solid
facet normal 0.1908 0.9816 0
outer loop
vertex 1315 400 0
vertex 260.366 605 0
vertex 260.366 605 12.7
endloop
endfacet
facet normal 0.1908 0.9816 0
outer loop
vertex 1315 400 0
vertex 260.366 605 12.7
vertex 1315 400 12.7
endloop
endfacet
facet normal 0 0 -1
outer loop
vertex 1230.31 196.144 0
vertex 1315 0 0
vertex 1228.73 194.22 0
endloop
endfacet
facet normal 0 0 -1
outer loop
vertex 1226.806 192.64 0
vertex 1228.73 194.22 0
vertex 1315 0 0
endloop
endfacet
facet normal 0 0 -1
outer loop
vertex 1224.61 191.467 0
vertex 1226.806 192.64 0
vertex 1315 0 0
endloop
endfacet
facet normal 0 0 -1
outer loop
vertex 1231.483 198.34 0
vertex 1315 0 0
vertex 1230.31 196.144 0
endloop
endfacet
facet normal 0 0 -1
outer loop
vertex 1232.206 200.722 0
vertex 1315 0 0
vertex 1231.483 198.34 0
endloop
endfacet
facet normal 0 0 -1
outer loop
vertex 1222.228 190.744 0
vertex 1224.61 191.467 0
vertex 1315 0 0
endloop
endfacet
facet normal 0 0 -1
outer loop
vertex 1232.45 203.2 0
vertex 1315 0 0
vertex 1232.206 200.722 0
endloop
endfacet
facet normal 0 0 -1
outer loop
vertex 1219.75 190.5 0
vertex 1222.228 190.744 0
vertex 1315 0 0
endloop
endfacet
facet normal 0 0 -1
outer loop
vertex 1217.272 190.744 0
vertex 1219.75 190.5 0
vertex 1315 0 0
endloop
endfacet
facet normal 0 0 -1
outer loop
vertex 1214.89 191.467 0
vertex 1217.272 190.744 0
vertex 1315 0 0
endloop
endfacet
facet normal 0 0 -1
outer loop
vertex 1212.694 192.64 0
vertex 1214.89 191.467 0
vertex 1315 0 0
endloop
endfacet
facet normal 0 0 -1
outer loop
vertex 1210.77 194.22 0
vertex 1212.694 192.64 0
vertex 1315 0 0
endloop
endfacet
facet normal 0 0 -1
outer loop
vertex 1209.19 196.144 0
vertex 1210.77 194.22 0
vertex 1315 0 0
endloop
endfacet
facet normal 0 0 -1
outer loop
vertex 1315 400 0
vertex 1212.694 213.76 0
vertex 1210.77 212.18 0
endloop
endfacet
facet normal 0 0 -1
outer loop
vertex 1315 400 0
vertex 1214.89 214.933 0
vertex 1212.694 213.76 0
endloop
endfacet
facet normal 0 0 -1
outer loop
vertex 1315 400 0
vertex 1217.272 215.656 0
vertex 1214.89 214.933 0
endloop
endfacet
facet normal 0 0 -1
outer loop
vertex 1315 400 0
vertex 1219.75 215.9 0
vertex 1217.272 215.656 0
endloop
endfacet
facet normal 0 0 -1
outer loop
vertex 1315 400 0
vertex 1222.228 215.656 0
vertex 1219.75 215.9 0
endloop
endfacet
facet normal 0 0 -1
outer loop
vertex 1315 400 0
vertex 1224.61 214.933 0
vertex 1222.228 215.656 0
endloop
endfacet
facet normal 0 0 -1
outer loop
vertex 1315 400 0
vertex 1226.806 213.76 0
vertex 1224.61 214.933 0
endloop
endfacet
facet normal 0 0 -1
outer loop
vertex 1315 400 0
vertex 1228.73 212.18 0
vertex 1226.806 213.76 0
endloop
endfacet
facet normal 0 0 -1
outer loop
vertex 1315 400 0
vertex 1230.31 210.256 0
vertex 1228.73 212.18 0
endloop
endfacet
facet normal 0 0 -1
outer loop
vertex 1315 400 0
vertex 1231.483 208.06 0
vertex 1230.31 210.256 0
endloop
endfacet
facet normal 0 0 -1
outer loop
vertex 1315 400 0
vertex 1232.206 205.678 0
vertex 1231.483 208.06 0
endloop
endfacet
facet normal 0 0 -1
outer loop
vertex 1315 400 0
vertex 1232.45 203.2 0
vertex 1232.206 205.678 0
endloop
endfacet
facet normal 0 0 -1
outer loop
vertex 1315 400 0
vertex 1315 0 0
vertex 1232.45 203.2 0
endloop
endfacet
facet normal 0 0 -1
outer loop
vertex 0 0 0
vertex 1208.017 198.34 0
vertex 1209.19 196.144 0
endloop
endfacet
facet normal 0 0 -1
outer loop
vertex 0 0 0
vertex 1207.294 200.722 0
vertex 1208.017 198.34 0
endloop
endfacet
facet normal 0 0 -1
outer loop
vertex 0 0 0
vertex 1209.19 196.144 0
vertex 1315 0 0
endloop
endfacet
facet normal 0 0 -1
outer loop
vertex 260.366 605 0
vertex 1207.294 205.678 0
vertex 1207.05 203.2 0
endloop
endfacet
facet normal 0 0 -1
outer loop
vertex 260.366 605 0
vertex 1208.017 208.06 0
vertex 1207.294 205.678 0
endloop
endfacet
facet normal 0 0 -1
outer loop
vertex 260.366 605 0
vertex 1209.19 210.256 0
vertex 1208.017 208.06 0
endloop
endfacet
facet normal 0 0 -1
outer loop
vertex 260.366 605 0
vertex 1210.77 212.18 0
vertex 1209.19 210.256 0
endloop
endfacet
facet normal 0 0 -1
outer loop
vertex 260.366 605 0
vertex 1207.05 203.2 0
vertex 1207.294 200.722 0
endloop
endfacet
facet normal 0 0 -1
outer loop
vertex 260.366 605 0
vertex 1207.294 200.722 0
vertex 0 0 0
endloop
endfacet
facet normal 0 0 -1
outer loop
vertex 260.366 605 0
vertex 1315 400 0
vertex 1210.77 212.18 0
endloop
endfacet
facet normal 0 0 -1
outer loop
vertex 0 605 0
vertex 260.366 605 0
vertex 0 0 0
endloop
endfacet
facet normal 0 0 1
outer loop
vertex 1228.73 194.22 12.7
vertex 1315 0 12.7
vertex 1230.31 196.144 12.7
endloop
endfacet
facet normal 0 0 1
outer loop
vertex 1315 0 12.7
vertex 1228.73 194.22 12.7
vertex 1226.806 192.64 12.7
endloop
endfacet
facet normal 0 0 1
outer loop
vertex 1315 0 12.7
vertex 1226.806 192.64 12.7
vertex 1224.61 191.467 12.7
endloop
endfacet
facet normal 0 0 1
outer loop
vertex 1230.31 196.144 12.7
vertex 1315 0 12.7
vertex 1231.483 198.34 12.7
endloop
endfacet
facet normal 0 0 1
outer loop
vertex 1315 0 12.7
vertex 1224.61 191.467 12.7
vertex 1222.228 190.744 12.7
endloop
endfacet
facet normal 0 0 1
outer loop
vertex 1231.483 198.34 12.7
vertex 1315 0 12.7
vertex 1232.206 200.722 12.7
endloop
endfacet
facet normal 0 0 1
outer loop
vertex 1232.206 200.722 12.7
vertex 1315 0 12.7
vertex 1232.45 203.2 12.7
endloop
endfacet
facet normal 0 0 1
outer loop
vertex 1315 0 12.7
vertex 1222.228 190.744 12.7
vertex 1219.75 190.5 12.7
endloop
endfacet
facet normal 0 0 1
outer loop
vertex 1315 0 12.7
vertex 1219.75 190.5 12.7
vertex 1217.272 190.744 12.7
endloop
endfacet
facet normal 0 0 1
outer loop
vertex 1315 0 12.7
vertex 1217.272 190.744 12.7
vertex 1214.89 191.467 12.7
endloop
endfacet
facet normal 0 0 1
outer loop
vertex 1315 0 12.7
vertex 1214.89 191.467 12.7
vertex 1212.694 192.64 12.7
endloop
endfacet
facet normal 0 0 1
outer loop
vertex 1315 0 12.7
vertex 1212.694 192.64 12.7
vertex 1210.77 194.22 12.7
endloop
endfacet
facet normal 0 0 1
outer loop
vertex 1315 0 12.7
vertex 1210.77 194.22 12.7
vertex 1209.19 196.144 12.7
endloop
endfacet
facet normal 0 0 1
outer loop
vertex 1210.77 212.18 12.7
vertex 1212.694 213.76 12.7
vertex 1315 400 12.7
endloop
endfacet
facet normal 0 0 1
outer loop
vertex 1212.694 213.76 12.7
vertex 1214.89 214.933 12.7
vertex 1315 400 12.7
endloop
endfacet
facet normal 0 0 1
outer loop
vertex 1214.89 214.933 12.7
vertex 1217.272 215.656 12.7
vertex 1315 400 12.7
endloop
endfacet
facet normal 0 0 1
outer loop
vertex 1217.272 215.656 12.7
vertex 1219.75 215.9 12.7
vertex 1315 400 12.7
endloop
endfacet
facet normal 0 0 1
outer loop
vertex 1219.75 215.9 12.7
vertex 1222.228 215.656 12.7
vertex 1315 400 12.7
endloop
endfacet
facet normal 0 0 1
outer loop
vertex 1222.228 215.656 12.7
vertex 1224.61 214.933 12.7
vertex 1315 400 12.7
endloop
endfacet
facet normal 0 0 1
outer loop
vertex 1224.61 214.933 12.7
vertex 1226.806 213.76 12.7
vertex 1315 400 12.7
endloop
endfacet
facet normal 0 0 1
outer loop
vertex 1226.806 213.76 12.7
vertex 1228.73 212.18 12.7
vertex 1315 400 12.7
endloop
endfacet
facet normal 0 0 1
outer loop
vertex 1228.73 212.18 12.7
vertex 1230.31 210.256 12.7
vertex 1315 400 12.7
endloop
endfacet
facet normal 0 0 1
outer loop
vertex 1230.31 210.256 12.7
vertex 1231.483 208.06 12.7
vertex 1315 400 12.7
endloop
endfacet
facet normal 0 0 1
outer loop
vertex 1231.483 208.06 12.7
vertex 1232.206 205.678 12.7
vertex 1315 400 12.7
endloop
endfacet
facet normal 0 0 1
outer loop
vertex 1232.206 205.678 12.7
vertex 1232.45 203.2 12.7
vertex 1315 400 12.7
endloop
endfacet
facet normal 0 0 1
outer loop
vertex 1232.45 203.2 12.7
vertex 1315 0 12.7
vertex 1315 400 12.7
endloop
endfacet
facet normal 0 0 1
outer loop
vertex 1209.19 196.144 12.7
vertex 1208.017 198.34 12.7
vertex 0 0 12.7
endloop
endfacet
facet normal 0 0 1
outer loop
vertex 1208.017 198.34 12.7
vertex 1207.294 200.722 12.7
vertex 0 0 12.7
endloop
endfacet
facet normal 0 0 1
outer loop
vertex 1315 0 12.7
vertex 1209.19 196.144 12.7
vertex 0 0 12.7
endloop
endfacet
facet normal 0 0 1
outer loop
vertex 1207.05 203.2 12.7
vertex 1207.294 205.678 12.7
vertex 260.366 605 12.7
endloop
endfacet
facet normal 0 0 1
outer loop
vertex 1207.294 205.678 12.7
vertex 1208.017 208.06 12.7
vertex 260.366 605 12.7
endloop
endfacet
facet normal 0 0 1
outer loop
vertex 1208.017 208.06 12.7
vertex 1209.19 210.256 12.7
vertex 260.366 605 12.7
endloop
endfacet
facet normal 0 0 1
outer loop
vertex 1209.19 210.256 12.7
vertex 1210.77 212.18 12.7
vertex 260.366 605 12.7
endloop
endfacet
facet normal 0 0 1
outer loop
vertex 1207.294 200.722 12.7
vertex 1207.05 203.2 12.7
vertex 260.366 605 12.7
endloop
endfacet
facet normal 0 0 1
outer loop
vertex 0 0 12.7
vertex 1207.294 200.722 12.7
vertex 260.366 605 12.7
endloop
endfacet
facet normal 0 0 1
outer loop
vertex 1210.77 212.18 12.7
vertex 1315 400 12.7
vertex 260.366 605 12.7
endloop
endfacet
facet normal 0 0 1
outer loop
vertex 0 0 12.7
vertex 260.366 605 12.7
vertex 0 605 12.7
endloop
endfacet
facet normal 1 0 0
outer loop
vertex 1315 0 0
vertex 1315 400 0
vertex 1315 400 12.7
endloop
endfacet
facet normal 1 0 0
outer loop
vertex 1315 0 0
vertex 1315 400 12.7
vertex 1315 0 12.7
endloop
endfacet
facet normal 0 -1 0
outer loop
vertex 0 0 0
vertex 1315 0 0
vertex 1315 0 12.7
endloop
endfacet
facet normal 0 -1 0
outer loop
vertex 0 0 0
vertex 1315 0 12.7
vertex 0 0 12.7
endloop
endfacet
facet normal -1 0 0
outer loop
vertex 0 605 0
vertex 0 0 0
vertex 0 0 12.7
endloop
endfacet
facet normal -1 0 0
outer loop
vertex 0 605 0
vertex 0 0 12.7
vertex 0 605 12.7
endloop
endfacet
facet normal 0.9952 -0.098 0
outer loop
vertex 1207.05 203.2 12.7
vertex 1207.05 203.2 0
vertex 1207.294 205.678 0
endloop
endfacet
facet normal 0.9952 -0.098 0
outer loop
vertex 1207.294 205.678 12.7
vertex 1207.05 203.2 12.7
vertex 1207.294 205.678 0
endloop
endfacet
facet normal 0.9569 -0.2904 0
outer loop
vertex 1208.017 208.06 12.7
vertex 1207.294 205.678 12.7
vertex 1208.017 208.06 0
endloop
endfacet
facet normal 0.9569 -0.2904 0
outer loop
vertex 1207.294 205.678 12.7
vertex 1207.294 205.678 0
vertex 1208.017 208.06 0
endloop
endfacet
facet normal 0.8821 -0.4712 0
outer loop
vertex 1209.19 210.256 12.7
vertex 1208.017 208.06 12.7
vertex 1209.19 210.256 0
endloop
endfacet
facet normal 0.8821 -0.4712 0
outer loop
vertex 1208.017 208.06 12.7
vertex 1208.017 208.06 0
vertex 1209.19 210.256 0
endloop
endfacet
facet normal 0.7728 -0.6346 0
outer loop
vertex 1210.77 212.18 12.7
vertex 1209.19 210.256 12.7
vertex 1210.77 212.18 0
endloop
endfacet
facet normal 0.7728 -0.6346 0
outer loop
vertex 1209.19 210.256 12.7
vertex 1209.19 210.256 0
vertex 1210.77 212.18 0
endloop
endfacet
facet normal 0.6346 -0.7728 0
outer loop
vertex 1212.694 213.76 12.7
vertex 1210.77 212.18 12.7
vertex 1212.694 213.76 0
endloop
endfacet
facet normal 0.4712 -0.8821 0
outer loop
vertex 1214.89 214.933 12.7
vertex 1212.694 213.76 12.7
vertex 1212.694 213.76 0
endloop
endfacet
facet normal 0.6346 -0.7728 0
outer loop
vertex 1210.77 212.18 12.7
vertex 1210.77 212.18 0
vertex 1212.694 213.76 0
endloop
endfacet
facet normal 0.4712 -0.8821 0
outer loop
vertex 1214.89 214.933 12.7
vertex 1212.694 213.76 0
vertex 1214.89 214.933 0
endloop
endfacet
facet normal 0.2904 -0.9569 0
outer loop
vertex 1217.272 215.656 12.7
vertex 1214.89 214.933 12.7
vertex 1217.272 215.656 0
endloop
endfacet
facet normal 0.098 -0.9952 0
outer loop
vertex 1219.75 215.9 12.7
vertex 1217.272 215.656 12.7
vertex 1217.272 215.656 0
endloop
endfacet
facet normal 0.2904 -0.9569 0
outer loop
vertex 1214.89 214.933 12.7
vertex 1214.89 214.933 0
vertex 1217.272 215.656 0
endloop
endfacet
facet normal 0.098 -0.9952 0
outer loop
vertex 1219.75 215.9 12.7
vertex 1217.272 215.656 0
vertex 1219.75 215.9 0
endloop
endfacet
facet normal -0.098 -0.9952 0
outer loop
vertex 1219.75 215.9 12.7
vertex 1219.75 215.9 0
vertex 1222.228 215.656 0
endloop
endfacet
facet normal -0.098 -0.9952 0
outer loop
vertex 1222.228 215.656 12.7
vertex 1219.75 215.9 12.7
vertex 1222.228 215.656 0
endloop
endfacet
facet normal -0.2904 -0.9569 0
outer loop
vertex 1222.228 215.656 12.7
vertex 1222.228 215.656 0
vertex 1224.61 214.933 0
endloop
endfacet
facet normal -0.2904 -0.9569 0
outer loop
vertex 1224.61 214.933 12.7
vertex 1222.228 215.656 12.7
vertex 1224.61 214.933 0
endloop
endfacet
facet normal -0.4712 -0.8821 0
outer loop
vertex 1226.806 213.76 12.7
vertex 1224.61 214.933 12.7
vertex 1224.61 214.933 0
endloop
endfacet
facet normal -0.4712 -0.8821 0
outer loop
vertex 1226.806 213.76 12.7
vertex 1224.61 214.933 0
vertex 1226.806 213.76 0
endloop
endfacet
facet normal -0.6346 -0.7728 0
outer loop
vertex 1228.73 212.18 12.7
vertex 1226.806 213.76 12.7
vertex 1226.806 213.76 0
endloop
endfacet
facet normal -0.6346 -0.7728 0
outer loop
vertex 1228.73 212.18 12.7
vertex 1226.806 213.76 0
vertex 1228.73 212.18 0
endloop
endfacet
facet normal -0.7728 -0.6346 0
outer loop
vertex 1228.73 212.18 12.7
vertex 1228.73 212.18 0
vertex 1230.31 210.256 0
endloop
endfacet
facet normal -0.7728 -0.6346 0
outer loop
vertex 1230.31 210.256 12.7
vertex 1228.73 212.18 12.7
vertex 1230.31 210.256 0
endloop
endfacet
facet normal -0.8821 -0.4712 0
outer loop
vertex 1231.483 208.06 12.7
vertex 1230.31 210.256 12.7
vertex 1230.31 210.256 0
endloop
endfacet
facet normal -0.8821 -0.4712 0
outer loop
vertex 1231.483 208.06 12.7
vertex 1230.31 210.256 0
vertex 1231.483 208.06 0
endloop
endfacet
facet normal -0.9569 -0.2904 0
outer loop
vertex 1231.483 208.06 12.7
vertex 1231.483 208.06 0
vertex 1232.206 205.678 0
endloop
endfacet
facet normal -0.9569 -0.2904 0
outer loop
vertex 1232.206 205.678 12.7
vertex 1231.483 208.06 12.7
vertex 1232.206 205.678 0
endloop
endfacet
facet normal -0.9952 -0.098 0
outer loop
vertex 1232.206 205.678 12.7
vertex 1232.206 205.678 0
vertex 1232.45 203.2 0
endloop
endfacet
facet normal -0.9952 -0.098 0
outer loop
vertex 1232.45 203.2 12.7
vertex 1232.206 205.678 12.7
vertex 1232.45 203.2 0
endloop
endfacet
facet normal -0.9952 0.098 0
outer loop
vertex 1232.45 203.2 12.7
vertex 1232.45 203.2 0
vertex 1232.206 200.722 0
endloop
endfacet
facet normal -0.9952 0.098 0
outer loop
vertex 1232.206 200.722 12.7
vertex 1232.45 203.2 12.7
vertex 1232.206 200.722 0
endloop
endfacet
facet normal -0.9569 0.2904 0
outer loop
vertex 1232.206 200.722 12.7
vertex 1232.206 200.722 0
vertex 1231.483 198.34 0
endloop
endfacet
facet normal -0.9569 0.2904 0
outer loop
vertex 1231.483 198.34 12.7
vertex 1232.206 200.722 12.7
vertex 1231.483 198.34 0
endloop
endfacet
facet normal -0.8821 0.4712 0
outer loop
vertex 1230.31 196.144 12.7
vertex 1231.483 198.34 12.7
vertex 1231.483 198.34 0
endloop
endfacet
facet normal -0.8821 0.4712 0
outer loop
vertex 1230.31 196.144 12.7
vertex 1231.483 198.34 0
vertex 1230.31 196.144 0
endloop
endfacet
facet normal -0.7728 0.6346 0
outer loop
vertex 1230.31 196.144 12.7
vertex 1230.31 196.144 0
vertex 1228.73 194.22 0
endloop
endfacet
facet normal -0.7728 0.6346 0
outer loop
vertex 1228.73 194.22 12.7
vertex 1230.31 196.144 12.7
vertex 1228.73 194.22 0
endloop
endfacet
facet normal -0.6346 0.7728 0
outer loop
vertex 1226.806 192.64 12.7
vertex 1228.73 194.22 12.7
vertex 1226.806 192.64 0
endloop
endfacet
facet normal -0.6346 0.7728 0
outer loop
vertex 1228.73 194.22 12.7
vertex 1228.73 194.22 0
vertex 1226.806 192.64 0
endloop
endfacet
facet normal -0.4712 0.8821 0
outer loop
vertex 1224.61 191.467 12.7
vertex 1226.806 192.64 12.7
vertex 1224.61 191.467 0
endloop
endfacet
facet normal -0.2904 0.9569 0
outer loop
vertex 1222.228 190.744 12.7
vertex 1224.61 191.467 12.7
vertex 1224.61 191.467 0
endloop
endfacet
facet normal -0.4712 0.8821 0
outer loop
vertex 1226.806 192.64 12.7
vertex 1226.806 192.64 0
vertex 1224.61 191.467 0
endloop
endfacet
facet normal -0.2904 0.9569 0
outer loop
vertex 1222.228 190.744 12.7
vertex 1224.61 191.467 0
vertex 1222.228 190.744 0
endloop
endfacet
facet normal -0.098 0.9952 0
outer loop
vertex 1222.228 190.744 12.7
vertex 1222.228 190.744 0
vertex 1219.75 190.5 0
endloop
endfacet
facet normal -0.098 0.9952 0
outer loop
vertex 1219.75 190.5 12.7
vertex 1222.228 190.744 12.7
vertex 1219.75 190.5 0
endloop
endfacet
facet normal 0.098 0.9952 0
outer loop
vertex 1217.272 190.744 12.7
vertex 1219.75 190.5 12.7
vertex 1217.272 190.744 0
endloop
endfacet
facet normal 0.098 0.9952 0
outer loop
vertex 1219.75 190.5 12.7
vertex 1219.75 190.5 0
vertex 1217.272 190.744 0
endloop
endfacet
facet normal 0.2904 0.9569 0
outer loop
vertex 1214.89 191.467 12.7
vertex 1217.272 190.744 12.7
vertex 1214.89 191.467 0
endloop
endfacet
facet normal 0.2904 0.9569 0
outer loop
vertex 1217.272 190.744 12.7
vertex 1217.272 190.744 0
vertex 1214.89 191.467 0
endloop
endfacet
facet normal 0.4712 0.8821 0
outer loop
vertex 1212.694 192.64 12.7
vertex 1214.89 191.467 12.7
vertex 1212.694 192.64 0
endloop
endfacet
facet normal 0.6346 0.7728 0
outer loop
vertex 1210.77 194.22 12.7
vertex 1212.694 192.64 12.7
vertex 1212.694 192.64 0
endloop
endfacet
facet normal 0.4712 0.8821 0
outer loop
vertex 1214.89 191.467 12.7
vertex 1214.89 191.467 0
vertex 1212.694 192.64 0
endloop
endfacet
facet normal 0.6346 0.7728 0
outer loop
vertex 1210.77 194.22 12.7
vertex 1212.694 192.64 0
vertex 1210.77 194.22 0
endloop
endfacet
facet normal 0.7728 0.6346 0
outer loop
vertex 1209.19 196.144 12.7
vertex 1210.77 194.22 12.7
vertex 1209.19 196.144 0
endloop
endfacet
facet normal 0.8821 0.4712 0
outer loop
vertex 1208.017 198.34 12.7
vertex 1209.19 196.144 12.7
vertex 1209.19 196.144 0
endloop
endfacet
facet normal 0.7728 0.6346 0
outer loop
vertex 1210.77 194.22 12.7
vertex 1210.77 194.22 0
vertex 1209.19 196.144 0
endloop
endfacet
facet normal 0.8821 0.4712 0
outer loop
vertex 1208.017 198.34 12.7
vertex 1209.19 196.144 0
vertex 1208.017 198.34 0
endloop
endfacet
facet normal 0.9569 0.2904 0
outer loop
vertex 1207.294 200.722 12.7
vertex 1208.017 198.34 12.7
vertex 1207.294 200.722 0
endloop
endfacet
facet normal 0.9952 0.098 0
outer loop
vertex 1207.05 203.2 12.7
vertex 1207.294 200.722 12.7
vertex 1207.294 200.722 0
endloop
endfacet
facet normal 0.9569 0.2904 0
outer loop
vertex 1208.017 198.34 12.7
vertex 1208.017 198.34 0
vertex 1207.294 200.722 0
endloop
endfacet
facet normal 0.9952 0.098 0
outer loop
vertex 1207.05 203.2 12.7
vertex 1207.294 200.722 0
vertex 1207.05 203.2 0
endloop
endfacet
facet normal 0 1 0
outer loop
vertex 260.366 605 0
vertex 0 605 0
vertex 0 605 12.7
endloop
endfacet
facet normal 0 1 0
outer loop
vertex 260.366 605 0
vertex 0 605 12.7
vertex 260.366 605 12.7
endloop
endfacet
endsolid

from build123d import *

# Parameters (mm, degrees)
BOSS_EXTRUDE1_DEPTH = 12.7
SKETCH2_R           = 12.7
CUT_EXTRUDE1_DEPTH  = 203.2


with BuildPart() as part:
    # Sketch1 → Boss-Extrude1 (new body)
    with BuildSketch(Plane.XY):
        Polygon((0, 0), (0, 605), (260.366426726, 605), (1315, 400), (1315, 0), align=None)
    extrude(amount=BOSS_EXTRUDE1_DEPTH)

    # Sketch2 → Cut-Extrude1 (cut)
    with BuildSketch(Plane(origin=(0, 0, 0), x_dir=(-1, 0, 0), z_dir=(0, 0, -1))):
        with Locations((-1219.75, 203.2)):
            Circle(SKETCH2_R)
    extrude(amount=-CUT_EXTRUDE1_DEPTH, mode=Mode.SUBTRACT)


solid = part.part
